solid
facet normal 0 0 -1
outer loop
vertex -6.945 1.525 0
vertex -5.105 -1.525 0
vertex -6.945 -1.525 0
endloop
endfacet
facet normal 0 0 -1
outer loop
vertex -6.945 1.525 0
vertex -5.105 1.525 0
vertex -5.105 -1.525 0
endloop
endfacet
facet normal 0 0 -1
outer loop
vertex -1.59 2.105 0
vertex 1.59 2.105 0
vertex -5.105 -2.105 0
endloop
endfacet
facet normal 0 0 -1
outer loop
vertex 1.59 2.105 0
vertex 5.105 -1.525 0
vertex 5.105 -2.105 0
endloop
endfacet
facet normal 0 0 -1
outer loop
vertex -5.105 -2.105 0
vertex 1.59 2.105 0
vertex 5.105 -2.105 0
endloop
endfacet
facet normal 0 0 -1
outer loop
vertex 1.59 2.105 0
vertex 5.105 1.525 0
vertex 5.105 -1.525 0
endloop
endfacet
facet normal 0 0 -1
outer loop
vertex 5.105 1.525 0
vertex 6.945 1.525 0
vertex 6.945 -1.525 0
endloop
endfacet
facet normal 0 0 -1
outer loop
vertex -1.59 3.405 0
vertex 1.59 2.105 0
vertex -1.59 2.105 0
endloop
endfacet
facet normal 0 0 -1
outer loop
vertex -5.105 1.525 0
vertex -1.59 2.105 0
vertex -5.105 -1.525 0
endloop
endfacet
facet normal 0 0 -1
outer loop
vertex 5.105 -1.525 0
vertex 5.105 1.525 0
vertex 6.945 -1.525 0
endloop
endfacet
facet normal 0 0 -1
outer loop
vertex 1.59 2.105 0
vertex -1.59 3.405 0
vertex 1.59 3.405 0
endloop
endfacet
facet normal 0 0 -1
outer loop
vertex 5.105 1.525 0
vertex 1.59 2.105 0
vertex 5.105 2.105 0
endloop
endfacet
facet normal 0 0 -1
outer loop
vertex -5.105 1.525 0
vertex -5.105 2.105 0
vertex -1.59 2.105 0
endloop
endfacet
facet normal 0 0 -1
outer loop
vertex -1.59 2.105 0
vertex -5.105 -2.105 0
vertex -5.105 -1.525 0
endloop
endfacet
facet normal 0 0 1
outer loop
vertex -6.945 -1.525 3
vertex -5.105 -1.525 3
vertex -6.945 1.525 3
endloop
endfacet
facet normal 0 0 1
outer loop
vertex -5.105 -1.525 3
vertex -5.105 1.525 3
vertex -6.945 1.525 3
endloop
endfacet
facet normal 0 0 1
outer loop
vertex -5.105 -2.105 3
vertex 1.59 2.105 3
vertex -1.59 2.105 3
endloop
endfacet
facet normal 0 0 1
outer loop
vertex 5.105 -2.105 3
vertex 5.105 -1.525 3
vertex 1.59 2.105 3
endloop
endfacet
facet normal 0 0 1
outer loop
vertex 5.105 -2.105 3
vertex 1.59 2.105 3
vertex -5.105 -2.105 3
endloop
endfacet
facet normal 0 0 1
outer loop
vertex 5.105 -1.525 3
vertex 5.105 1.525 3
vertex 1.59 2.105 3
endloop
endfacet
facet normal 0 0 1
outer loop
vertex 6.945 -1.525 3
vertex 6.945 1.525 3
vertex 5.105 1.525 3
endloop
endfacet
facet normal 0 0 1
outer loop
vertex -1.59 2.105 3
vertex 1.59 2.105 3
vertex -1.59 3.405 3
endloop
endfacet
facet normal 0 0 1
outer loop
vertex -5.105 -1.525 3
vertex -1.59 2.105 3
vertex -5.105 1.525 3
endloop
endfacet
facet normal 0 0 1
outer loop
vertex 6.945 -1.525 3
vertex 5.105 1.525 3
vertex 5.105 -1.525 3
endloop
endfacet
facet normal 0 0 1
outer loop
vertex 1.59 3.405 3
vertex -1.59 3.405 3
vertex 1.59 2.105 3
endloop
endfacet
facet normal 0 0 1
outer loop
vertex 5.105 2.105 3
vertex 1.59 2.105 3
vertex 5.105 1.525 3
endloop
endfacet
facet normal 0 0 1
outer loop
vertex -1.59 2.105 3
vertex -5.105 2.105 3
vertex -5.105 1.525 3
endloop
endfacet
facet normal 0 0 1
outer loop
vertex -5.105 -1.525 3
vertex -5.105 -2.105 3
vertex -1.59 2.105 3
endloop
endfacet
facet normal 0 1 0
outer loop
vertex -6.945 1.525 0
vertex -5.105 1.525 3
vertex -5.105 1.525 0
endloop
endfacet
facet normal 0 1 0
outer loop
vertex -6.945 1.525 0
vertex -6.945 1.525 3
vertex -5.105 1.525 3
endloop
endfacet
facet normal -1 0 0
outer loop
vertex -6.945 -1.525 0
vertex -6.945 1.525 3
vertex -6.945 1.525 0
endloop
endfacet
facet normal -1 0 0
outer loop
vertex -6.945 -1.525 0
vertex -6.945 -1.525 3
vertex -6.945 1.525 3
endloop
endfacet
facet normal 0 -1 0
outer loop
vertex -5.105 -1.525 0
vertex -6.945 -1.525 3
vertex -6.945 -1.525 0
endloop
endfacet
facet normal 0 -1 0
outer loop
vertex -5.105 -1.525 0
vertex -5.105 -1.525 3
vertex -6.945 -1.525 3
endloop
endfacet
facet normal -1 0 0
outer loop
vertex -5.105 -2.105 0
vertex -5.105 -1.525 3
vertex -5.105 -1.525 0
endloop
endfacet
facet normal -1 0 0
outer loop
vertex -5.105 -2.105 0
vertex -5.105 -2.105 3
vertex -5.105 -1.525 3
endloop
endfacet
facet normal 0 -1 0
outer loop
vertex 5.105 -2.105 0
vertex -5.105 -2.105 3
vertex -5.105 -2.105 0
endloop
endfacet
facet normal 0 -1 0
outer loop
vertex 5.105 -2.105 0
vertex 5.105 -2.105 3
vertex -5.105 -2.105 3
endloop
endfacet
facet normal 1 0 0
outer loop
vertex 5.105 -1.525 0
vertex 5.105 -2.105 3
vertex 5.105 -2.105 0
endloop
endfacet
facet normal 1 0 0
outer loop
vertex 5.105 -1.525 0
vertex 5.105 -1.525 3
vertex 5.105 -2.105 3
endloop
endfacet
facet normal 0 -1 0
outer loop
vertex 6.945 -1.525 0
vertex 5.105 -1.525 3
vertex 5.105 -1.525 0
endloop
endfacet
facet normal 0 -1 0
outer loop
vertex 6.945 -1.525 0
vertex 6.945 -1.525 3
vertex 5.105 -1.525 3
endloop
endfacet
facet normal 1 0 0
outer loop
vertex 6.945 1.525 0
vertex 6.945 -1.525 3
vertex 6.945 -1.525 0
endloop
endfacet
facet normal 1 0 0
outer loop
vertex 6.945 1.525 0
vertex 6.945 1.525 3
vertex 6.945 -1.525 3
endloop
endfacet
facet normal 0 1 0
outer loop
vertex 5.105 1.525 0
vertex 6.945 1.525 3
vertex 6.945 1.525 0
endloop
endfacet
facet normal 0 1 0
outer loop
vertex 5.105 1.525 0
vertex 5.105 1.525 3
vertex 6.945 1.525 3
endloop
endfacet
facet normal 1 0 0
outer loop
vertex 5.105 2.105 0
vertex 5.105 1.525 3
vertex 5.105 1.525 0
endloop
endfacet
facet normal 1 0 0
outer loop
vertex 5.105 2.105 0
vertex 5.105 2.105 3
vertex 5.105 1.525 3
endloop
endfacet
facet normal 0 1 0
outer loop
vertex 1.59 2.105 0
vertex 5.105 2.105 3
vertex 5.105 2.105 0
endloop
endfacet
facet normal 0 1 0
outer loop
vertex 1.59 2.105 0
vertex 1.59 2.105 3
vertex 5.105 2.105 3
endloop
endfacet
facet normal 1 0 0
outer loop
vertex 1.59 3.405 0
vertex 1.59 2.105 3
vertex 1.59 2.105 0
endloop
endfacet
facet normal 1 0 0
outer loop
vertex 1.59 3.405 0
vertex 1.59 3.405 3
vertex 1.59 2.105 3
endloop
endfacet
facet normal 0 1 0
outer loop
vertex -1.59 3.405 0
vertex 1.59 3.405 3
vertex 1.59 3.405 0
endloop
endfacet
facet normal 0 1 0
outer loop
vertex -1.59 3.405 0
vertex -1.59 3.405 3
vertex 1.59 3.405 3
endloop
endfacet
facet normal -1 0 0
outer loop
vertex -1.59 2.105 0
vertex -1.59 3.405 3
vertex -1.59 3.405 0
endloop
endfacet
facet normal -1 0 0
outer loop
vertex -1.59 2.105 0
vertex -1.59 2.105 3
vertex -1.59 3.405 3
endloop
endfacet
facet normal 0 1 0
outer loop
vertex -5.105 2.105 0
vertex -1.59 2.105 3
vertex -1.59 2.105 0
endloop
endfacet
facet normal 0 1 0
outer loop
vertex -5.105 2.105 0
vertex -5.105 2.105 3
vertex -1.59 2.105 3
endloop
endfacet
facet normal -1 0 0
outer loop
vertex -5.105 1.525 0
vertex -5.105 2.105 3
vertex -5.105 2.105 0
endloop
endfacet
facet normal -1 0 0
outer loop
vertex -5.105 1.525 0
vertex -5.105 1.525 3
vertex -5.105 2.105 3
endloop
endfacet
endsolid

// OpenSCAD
module molex_microfit_cutout() {
    base_w = 10.21;
    base_h = 4.21;

    ears_w = 13.89;
    ears_h = 3.05;

    notch_w = 3.18;
    notch_h = 1.3;

    union() {
        // Base rectangle
        translate([-(base_w/2), -(base_h/2)])
            square([base_w, base_h]);

        // Mounting ears rectangle
        translate([-(ears_w/2), -(ears_h/2)])
            square([ears_w, ears_h]);

        // Top notch
        translate([-(notch_w/2), base_h/2])
            square([notch_w, notch_h]);
    }
}

// Uncomment below to extrude into 3D
 linear_extrude(height = 3)
     molex_microfit_cutout();

// Or just preview in 2D
molex_microfit_cutout();
